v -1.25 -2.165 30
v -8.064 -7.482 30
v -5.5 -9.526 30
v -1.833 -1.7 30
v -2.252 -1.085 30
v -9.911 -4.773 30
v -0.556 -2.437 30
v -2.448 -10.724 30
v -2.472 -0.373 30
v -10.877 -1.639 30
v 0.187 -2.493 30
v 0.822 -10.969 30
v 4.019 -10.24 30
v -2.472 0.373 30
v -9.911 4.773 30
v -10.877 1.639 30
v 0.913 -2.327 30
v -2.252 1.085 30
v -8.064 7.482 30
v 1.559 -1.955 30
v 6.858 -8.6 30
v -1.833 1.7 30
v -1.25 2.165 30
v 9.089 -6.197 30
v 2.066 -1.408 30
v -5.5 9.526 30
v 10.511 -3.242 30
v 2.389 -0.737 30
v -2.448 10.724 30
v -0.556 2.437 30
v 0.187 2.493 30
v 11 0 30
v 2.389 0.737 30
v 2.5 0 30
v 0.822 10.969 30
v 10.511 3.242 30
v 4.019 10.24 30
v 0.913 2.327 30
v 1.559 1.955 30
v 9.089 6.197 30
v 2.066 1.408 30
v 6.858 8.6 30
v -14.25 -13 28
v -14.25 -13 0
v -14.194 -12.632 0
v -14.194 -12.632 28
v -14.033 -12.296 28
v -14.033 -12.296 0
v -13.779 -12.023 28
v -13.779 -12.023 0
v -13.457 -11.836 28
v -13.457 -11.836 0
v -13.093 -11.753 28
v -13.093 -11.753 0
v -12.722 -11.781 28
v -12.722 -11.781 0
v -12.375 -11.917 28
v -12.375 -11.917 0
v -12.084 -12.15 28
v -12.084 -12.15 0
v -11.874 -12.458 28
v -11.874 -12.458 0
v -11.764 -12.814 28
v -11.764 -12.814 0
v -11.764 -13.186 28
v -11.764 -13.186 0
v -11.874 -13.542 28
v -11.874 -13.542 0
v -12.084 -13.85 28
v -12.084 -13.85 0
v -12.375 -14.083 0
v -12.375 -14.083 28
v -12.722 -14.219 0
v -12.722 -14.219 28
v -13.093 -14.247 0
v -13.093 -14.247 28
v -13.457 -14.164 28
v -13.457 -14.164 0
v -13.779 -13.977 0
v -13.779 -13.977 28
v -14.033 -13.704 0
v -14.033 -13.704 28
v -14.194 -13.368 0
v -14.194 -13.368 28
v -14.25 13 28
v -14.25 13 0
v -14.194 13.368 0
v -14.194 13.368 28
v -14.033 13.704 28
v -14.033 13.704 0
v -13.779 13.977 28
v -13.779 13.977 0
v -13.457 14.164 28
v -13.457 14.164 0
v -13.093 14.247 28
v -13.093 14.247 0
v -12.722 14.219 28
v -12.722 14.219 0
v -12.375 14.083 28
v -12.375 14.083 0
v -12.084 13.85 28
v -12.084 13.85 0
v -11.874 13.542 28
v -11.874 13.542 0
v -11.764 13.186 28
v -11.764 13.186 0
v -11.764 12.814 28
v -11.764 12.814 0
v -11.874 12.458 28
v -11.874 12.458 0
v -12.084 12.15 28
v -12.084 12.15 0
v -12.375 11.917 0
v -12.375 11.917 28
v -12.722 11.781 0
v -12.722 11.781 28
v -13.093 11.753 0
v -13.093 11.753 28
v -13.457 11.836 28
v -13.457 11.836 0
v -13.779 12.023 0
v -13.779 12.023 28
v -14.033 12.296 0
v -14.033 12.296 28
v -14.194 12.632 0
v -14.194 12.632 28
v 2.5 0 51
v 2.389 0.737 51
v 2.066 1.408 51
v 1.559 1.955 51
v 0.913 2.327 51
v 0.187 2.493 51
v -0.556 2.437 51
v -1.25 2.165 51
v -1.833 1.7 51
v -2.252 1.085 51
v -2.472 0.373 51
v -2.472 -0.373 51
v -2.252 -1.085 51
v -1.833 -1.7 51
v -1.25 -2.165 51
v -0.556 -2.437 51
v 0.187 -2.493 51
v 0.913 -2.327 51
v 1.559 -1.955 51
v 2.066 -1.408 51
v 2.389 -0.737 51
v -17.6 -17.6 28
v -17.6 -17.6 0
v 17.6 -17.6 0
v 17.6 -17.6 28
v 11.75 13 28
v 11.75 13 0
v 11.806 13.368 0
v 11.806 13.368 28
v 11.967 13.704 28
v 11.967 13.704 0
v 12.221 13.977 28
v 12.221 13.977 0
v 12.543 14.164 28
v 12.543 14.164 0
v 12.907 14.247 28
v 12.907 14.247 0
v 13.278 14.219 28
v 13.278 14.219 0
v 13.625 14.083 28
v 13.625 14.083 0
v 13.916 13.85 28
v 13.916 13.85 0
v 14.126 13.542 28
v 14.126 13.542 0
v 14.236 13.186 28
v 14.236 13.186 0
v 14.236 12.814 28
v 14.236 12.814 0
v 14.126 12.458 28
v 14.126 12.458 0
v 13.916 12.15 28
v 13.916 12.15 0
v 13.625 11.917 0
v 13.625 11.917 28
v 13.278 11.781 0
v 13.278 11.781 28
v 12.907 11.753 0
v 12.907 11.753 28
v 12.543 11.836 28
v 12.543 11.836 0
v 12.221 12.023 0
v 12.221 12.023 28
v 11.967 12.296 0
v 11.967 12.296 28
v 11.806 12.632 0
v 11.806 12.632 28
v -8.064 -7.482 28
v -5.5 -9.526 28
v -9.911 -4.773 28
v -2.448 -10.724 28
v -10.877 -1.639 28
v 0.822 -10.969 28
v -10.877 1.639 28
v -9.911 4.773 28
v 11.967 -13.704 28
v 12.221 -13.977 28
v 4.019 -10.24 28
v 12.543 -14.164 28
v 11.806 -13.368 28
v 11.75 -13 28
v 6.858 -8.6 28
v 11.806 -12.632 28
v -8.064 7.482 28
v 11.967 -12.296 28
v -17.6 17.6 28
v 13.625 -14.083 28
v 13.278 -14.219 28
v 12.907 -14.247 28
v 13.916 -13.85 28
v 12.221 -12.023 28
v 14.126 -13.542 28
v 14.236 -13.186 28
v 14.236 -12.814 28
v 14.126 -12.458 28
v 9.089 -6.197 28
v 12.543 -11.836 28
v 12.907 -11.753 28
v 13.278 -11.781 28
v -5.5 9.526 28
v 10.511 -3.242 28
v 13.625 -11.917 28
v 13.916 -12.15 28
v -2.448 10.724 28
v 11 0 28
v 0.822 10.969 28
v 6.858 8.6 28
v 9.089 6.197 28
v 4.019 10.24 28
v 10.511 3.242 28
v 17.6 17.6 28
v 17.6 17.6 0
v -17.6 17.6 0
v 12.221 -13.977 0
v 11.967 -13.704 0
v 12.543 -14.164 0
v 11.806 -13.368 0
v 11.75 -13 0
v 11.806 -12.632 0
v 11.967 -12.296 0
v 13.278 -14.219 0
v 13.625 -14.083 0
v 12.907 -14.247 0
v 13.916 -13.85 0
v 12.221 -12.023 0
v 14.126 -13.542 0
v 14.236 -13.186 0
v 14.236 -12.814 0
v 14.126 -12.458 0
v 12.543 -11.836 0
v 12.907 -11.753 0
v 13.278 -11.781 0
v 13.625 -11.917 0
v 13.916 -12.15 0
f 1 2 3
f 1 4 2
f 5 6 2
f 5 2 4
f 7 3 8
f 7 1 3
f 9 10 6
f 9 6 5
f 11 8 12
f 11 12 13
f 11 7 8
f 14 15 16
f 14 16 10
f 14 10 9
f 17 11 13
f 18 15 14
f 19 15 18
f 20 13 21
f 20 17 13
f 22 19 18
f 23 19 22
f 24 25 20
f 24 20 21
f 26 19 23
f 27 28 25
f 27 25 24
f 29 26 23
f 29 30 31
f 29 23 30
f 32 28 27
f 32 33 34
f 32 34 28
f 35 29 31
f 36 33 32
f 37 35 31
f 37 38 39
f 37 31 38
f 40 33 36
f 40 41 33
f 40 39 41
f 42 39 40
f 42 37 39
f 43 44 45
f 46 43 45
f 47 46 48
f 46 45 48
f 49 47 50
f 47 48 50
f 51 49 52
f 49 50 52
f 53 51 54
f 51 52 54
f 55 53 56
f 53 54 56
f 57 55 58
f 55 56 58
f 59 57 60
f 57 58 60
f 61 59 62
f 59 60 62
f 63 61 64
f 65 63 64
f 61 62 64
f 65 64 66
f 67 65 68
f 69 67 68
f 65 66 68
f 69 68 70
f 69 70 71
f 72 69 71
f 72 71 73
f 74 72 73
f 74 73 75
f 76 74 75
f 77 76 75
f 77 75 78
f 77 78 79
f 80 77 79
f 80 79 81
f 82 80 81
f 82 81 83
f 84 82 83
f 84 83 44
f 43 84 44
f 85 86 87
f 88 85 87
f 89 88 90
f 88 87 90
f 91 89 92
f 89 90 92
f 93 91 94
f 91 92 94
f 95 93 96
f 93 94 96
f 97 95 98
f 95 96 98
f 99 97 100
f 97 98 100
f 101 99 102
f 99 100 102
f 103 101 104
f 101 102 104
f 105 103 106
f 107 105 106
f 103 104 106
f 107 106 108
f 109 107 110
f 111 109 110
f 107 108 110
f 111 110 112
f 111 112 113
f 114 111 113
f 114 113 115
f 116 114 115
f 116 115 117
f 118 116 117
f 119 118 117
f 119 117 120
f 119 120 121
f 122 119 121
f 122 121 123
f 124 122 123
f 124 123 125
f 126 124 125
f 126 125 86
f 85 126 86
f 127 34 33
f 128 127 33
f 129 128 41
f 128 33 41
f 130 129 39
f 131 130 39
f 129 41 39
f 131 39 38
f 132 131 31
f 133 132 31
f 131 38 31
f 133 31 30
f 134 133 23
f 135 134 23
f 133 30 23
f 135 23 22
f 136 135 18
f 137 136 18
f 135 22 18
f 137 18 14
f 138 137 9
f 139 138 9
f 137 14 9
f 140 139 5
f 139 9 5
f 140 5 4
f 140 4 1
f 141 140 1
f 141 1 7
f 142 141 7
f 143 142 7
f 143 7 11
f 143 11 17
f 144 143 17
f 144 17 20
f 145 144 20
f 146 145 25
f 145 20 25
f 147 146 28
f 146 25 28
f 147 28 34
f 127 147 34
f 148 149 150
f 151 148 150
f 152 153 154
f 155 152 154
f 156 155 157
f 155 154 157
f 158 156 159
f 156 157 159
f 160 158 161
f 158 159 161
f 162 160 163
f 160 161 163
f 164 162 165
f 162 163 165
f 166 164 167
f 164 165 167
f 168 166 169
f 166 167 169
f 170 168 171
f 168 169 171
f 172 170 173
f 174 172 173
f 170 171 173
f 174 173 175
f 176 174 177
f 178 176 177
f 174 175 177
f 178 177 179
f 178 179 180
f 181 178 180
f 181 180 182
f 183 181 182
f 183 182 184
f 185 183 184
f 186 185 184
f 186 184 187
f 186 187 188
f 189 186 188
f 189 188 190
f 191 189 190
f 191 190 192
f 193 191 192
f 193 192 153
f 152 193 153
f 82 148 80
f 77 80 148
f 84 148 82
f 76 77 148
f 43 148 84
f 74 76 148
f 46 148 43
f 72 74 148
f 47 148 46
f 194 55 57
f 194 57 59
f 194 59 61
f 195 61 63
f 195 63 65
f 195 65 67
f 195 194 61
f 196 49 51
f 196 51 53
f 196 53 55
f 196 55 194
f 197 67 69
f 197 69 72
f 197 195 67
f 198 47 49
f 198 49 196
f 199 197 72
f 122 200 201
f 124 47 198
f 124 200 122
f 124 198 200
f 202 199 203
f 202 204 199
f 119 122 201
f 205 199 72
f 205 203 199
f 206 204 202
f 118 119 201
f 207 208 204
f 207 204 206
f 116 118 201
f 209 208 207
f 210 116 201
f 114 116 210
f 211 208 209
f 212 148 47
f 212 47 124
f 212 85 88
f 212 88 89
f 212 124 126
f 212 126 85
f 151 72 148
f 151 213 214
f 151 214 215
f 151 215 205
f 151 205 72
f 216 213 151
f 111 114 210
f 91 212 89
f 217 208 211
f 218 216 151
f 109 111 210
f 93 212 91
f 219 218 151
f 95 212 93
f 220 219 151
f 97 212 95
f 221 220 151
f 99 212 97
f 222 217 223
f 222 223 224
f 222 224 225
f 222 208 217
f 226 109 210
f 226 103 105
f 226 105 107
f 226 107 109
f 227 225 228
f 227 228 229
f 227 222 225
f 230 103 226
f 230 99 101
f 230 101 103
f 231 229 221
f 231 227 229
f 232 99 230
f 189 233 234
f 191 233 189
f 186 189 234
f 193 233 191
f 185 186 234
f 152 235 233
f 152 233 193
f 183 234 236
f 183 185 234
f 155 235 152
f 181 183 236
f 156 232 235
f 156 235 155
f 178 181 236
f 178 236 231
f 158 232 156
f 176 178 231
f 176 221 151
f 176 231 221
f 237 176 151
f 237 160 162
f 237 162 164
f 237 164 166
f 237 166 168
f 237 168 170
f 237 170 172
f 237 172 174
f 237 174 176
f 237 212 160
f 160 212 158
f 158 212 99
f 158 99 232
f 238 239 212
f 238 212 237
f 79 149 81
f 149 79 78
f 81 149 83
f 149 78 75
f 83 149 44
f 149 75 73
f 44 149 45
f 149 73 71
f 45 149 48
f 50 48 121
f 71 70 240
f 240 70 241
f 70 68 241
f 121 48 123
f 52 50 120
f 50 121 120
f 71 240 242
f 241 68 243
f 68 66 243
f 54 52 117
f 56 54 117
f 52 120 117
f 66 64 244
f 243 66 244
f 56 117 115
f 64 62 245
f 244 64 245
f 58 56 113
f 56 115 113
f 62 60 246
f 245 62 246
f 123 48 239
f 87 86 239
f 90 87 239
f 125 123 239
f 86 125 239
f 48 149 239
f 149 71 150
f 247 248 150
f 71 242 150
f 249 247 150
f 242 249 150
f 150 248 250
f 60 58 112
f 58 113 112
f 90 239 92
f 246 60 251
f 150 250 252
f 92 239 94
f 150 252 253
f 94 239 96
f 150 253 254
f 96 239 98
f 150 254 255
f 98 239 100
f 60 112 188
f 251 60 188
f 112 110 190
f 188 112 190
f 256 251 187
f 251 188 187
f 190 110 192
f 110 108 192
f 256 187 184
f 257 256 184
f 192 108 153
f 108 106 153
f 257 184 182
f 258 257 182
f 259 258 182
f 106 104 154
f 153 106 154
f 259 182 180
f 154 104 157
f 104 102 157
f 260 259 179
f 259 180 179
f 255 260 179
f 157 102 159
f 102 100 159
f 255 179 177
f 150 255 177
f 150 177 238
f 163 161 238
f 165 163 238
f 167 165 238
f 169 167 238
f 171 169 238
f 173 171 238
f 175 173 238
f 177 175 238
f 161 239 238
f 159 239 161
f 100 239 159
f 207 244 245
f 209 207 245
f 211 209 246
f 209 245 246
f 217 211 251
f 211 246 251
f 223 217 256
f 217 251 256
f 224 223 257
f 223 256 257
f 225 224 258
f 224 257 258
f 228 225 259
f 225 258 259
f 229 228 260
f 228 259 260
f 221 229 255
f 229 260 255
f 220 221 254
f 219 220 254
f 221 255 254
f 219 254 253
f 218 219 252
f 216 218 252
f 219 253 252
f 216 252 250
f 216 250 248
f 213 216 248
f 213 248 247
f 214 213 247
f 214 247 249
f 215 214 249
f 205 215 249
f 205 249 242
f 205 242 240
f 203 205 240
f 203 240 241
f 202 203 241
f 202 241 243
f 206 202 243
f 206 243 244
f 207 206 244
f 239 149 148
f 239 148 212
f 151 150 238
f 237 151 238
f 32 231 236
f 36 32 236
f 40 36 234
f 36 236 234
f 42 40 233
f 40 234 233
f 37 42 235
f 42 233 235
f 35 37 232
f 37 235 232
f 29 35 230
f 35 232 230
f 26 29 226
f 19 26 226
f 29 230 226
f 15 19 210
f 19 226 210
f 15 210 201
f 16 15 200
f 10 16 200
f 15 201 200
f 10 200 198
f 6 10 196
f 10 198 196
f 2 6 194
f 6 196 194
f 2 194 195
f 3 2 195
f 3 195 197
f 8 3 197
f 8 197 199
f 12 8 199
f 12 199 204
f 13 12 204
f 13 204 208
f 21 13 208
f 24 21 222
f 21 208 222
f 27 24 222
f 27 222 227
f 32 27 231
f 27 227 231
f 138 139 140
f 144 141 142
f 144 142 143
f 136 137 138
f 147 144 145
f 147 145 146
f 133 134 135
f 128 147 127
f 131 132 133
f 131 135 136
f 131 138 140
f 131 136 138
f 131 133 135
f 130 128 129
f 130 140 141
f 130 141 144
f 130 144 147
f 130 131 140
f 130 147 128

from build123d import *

# Parameters (mm, degrees)
F0_W     = 35.2
F0_H     = 35.2
F1_DEPTH = 28
F2_R     = 11
F3_DEPTH = 2
F4_R     = 2.5
F5_DEPTH = 21
F7_D     = 2.5


with BuildPart() as f1:
    # F0 (on Top) → F1 (new body)
    with BuildSketch(Plane.XY):
        Rectangle(F0_W, F0_H)
    extrude(amount=F1_DEPTH)

    # F2 (on face) → F3 (join)
    with BuildSketch(Plane.XY.offset(28)):
        Circle(F2_R)
    extrude(amount=F3_DEPTH)

    # F4 (on face) → F5 (join)
    with BuildSketch(Plane.XY.offset(30)):
        Circle(F4_R)
    extrude(amount=F5_DEPTH)

    # F7 (through all)
    with Locations(Plane.XY.offset(28)):
        with Locations((13, 13), (13, -13), (-13, -13), (-13, 13)):
            Hole(F7_D / 2)


solid = f1.part
